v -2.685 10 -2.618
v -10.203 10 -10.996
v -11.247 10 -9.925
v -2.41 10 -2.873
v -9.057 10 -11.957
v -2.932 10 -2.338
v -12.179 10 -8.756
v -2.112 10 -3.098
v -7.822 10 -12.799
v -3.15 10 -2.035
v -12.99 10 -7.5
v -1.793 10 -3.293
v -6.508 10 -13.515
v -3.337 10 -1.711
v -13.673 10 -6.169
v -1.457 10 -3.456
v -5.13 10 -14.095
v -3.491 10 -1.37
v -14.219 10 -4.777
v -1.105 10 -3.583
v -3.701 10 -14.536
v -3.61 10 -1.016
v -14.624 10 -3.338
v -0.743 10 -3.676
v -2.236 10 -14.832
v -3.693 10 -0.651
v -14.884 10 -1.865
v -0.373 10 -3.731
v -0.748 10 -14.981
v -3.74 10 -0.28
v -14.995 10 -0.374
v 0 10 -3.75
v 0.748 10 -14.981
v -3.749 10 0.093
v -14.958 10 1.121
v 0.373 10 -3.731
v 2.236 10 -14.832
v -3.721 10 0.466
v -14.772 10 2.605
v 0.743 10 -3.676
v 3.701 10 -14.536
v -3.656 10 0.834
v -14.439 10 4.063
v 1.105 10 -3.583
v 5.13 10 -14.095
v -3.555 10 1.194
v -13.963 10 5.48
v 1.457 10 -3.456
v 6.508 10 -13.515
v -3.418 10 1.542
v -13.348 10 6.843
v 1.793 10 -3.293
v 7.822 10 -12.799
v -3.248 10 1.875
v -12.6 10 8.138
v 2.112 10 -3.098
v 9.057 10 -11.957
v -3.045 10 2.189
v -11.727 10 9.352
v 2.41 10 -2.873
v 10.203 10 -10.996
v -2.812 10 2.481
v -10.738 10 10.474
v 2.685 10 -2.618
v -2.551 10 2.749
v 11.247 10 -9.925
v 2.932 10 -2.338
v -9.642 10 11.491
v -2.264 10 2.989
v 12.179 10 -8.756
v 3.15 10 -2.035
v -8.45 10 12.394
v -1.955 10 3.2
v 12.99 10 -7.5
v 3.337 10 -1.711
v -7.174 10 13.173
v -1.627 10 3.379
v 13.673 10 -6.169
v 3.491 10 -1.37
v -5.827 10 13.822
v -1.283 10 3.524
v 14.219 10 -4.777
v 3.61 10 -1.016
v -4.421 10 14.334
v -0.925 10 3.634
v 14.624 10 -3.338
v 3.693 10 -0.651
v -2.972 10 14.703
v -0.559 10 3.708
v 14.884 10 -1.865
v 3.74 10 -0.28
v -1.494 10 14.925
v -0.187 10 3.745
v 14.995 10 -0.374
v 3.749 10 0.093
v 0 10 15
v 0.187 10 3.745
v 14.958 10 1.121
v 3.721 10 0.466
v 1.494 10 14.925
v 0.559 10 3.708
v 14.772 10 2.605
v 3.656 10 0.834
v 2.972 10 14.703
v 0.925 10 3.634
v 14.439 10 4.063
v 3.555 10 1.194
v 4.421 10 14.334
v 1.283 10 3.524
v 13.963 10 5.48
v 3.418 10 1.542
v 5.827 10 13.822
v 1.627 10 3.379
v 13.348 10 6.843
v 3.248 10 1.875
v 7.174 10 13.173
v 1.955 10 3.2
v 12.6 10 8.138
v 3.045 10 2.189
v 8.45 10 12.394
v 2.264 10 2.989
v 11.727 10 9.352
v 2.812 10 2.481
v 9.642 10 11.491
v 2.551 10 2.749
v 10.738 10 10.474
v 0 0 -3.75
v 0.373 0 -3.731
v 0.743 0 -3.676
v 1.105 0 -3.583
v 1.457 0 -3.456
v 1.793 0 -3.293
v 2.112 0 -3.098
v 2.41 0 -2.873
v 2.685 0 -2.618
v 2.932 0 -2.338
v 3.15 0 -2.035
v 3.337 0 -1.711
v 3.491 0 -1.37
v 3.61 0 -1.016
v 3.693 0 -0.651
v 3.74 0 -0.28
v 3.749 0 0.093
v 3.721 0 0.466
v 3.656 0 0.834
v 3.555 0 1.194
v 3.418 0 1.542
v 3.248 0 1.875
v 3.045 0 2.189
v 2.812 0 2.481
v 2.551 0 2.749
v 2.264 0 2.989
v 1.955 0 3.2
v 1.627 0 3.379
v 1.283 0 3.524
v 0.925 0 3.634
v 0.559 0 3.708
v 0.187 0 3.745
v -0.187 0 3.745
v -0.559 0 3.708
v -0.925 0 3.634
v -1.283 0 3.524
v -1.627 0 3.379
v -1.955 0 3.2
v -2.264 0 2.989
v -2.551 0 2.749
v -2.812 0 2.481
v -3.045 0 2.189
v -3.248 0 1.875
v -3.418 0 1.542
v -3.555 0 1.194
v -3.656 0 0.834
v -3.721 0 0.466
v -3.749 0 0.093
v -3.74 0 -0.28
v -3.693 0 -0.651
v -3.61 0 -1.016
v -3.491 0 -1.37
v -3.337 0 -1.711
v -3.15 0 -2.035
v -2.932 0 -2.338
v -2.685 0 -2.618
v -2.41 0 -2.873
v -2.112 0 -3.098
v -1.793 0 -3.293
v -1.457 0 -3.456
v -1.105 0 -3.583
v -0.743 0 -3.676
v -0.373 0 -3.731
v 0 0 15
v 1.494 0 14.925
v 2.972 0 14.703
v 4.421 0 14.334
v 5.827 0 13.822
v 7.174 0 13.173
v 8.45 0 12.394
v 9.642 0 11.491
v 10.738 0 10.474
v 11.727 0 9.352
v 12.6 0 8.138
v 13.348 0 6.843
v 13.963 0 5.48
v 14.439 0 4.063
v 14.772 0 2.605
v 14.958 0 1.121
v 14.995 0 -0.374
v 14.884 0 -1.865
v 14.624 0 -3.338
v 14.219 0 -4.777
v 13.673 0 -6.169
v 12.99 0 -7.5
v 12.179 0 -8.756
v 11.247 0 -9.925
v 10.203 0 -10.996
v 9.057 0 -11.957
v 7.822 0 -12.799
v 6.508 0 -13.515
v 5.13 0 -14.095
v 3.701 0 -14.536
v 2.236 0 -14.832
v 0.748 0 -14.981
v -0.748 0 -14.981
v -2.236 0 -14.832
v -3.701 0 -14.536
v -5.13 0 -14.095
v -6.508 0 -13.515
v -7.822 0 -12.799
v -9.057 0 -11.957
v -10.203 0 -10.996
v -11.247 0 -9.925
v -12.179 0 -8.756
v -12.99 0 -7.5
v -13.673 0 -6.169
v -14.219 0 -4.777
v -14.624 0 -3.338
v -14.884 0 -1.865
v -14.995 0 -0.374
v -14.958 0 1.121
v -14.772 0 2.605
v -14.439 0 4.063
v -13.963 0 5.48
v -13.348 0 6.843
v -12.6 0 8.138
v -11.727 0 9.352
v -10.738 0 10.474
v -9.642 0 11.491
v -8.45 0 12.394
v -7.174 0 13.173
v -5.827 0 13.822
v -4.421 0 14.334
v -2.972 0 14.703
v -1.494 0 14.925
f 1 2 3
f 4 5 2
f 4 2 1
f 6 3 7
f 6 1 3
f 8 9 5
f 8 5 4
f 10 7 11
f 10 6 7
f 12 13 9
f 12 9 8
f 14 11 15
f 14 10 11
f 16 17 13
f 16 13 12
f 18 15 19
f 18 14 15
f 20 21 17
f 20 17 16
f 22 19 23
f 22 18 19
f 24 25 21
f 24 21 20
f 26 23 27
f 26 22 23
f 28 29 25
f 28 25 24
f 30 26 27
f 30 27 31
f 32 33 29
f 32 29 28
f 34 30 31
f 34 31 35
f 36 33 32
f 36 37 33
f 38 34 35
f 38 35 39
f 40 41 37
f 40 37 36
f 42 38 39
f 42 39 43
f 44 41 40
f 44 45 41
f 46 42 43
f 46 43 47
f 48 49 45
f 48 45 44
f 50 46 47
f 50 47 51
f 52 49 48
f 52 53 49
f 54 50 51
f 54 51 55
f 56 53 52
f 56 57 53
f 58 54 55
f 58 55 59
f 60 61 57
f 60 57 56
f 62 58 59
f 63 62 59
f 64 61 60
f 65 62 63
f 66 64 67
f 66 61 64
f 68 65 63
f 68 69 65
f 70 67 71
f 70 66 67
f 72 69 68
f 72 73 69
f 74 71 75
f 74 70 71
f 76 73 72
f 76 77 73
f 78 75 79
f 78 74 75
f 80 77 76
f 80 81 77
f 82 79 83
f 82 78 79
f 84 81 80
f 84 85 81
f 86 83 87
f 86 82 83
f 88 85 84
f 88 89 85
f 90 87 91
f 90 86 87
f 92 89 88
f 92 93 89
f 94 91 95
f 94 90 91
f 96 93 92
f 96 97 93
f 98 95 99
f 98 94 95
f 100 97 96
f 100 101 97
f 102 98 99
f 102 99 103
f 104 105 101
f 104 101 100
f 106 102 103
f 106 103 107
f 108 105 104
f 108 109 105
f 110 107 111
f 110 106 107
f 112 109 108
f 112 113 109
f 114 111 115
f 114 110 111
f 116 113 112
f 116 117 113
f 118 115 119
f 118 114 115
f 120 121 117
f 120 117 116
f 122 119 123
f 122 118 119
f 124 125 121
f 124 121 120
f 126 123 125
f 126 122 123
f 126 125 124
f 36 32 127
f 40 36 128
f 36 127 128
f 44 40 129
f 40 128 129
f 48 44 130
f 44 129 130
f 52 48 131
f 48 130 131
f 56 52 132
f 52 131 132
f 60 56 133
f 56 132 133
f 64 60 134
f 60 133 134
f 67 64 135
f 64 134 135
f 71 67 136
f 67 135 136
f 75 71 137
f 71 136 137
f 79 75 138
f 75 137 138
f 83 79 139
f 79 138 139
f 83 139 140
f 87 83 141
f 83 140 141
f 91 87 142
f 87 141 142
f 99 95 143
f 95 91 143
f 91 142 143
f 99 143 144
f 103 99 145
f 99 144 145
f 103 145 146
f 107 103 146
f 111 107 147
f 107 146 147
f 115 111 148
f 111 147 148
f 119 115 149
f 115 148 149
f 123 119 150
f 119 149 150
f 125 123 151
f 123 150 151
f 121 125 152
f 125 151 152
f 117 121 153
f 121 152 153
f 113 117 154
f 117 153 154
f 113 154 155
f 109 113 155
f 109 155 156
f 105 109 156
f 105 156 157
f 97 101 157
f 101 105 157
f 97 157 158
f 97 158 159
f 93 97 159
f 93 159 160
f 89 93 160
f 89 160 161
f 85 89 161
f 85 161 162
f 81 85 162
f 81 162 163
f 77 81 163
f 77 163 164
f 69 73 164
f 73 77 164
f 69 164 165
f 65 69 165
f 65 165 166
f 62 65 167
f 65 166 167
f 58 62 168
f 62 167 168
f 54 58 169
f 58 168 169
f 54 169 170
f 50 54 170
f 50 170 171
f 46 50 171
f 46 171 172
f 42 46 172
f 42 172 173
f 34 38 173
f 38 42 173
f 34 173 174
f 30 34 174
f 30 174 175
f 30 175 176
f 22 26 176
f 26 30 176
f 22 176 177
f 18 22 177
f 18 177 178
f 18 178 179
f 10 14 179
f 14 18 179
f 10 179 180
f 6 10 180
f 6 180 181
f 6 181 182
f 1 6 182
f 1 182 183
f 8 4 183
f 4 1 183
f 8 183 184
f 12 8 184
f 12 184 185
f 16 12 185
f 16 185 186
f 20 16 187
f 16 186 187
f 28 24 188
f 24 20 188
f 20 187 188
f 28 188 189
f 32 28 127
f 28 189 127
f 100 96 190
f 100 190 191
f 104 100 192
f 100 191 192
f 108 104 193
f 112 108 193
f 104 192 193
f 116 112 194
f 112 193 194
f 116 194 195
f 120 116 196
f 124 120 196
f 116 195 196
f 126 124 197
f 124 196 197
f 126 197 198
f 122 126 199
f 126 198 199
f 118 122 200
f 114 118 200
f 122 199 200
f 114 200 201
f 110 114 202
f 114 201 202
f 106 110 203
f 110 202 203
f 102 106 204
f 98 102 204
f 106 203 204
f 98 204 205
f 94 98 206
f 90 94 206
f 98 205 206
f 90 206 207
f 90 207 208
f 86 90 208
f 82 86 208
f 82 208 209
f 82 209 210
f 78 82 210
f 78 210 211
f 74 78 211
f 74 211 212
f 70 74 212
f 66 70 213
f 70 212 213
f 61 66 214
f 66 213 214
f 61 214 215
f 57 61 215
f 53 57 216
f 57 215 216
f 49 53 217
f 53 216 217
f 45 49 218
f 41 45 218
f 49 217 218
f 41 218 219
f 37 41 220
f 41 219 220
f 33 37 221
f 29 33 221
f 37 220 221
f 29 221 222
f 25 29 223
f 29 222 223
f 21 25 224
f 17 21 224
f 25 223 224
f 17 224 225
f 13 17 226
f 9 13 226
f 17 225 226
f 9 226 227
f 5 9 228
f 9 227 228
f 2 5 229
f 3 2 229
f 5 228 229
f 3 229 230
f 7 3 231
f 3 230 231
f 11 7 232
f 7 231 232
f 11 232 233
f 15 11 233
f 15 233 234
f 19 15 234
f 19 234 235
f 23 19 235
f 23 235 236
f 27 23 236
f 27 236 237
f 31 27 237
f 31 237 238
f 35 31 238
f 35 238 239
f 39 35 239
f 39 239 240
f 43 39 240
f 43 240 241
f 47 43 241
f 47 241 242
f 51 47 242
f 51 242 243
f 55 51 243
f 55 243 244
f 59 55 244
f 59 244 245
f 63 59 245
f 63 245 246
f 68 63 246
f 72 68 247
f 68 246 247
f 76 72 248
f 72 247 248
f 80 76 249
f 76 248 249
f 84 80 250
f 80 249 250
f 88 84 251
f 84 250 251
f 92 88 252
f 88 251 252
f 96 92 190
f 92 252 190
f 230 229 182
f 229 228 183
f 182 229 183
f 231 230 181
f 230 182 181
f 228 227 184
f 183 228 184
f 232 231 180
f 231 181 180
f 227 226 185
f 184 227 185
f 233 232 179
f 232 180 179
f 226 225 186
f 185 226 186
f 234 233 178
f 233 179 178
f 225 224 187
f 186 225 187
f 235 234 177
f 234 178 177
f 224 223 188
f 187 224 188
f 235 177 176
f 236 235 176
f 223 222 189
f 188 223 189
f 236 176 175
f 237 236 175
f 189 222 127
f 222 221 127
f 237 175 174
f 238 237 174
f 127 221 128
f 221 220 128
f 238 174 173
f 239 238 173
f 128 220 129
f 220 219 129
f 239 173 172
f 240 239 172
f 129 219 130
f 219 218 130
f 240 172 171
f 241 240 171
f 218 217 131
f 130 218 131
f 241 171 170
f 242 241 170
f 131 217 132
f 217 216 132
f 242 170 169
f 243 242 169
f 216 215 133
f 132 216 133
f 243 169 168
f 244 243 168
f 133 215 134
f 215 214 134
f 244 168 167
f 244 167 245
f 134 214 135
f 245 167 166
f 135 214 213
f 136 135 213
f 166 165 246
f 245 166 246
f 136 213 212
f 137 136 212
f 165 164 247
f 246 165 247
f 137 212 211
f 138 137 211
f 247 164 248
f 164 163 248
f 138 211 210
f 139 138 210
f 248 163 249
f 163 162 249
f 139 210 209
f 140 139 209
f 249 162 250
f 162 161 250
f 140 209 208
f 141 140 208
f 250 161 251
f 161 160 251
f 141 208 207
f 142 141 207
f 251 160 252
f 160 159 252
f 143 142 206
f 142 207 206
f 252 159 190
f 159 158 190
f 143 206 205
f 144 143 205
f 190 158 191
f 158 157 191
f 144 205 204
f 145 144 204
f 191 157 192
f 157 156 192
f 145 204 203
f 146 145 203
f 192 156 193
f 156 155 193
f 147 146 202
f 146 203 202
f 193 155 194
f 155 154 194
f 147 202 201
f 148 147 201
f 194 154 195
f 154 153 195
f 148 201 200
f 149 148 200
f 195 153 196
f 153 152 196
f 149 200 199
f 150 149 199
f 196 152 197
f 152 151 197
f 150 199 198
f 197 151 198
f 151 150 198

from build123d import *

# Parameters (mm, degrees)
SKETCH1_R           = 15
BOSS_EXTRUDE1_DEPTH = 10
SKETCH2_R           = 3.75
CUT_EXTRUDE1_DEPTH  = 5
SKETCH3_R           = 3.75
CUT_EXTRUDE2_DEPTH  = 24.452078799


with BuildPart() as part:
    # Sketch1 → Boss-Extrude1 (new body)
    with BuildSketch(Plane(origin=(0, 0, 0), x_dir=(1, 0, 0), z_dir=(0, 1, 0))):
        with Locations(Location((0, 0, 0), (0, 0, 270))):
            Circle(SKETCH1_R)
    extrude(amount=BOSS_EXTRUDE1_DEPTH)

    # Sketch2 → Cut-Extrude1 (cut)
    with BuildSketch(Plane.XZ):
        with Locations(Location((0, 0, 0), (0, 0, 270))):
            Circle(SKETCH2_R)
    extrude(amount=-CUT_EXTRUDE1_DEPTH, mode=Mode.SUBTRACT)

    # Sketch3 → Cut-Extrude2 (cut, through all)
    with BuildSketch(Plane(origin=(0, 10, 0), x_dir=(1, 0, 0), z_dir=(0, 1, 0))):
        with Locations(Location((0, 0, 0), (0, 0, 90))):
            Circle(SKETCH3_R)
    extrude(amount=-CUT_EXTRUDE2_DEPTH, mode=Mode.SUBTRACT)


solid = part.part
